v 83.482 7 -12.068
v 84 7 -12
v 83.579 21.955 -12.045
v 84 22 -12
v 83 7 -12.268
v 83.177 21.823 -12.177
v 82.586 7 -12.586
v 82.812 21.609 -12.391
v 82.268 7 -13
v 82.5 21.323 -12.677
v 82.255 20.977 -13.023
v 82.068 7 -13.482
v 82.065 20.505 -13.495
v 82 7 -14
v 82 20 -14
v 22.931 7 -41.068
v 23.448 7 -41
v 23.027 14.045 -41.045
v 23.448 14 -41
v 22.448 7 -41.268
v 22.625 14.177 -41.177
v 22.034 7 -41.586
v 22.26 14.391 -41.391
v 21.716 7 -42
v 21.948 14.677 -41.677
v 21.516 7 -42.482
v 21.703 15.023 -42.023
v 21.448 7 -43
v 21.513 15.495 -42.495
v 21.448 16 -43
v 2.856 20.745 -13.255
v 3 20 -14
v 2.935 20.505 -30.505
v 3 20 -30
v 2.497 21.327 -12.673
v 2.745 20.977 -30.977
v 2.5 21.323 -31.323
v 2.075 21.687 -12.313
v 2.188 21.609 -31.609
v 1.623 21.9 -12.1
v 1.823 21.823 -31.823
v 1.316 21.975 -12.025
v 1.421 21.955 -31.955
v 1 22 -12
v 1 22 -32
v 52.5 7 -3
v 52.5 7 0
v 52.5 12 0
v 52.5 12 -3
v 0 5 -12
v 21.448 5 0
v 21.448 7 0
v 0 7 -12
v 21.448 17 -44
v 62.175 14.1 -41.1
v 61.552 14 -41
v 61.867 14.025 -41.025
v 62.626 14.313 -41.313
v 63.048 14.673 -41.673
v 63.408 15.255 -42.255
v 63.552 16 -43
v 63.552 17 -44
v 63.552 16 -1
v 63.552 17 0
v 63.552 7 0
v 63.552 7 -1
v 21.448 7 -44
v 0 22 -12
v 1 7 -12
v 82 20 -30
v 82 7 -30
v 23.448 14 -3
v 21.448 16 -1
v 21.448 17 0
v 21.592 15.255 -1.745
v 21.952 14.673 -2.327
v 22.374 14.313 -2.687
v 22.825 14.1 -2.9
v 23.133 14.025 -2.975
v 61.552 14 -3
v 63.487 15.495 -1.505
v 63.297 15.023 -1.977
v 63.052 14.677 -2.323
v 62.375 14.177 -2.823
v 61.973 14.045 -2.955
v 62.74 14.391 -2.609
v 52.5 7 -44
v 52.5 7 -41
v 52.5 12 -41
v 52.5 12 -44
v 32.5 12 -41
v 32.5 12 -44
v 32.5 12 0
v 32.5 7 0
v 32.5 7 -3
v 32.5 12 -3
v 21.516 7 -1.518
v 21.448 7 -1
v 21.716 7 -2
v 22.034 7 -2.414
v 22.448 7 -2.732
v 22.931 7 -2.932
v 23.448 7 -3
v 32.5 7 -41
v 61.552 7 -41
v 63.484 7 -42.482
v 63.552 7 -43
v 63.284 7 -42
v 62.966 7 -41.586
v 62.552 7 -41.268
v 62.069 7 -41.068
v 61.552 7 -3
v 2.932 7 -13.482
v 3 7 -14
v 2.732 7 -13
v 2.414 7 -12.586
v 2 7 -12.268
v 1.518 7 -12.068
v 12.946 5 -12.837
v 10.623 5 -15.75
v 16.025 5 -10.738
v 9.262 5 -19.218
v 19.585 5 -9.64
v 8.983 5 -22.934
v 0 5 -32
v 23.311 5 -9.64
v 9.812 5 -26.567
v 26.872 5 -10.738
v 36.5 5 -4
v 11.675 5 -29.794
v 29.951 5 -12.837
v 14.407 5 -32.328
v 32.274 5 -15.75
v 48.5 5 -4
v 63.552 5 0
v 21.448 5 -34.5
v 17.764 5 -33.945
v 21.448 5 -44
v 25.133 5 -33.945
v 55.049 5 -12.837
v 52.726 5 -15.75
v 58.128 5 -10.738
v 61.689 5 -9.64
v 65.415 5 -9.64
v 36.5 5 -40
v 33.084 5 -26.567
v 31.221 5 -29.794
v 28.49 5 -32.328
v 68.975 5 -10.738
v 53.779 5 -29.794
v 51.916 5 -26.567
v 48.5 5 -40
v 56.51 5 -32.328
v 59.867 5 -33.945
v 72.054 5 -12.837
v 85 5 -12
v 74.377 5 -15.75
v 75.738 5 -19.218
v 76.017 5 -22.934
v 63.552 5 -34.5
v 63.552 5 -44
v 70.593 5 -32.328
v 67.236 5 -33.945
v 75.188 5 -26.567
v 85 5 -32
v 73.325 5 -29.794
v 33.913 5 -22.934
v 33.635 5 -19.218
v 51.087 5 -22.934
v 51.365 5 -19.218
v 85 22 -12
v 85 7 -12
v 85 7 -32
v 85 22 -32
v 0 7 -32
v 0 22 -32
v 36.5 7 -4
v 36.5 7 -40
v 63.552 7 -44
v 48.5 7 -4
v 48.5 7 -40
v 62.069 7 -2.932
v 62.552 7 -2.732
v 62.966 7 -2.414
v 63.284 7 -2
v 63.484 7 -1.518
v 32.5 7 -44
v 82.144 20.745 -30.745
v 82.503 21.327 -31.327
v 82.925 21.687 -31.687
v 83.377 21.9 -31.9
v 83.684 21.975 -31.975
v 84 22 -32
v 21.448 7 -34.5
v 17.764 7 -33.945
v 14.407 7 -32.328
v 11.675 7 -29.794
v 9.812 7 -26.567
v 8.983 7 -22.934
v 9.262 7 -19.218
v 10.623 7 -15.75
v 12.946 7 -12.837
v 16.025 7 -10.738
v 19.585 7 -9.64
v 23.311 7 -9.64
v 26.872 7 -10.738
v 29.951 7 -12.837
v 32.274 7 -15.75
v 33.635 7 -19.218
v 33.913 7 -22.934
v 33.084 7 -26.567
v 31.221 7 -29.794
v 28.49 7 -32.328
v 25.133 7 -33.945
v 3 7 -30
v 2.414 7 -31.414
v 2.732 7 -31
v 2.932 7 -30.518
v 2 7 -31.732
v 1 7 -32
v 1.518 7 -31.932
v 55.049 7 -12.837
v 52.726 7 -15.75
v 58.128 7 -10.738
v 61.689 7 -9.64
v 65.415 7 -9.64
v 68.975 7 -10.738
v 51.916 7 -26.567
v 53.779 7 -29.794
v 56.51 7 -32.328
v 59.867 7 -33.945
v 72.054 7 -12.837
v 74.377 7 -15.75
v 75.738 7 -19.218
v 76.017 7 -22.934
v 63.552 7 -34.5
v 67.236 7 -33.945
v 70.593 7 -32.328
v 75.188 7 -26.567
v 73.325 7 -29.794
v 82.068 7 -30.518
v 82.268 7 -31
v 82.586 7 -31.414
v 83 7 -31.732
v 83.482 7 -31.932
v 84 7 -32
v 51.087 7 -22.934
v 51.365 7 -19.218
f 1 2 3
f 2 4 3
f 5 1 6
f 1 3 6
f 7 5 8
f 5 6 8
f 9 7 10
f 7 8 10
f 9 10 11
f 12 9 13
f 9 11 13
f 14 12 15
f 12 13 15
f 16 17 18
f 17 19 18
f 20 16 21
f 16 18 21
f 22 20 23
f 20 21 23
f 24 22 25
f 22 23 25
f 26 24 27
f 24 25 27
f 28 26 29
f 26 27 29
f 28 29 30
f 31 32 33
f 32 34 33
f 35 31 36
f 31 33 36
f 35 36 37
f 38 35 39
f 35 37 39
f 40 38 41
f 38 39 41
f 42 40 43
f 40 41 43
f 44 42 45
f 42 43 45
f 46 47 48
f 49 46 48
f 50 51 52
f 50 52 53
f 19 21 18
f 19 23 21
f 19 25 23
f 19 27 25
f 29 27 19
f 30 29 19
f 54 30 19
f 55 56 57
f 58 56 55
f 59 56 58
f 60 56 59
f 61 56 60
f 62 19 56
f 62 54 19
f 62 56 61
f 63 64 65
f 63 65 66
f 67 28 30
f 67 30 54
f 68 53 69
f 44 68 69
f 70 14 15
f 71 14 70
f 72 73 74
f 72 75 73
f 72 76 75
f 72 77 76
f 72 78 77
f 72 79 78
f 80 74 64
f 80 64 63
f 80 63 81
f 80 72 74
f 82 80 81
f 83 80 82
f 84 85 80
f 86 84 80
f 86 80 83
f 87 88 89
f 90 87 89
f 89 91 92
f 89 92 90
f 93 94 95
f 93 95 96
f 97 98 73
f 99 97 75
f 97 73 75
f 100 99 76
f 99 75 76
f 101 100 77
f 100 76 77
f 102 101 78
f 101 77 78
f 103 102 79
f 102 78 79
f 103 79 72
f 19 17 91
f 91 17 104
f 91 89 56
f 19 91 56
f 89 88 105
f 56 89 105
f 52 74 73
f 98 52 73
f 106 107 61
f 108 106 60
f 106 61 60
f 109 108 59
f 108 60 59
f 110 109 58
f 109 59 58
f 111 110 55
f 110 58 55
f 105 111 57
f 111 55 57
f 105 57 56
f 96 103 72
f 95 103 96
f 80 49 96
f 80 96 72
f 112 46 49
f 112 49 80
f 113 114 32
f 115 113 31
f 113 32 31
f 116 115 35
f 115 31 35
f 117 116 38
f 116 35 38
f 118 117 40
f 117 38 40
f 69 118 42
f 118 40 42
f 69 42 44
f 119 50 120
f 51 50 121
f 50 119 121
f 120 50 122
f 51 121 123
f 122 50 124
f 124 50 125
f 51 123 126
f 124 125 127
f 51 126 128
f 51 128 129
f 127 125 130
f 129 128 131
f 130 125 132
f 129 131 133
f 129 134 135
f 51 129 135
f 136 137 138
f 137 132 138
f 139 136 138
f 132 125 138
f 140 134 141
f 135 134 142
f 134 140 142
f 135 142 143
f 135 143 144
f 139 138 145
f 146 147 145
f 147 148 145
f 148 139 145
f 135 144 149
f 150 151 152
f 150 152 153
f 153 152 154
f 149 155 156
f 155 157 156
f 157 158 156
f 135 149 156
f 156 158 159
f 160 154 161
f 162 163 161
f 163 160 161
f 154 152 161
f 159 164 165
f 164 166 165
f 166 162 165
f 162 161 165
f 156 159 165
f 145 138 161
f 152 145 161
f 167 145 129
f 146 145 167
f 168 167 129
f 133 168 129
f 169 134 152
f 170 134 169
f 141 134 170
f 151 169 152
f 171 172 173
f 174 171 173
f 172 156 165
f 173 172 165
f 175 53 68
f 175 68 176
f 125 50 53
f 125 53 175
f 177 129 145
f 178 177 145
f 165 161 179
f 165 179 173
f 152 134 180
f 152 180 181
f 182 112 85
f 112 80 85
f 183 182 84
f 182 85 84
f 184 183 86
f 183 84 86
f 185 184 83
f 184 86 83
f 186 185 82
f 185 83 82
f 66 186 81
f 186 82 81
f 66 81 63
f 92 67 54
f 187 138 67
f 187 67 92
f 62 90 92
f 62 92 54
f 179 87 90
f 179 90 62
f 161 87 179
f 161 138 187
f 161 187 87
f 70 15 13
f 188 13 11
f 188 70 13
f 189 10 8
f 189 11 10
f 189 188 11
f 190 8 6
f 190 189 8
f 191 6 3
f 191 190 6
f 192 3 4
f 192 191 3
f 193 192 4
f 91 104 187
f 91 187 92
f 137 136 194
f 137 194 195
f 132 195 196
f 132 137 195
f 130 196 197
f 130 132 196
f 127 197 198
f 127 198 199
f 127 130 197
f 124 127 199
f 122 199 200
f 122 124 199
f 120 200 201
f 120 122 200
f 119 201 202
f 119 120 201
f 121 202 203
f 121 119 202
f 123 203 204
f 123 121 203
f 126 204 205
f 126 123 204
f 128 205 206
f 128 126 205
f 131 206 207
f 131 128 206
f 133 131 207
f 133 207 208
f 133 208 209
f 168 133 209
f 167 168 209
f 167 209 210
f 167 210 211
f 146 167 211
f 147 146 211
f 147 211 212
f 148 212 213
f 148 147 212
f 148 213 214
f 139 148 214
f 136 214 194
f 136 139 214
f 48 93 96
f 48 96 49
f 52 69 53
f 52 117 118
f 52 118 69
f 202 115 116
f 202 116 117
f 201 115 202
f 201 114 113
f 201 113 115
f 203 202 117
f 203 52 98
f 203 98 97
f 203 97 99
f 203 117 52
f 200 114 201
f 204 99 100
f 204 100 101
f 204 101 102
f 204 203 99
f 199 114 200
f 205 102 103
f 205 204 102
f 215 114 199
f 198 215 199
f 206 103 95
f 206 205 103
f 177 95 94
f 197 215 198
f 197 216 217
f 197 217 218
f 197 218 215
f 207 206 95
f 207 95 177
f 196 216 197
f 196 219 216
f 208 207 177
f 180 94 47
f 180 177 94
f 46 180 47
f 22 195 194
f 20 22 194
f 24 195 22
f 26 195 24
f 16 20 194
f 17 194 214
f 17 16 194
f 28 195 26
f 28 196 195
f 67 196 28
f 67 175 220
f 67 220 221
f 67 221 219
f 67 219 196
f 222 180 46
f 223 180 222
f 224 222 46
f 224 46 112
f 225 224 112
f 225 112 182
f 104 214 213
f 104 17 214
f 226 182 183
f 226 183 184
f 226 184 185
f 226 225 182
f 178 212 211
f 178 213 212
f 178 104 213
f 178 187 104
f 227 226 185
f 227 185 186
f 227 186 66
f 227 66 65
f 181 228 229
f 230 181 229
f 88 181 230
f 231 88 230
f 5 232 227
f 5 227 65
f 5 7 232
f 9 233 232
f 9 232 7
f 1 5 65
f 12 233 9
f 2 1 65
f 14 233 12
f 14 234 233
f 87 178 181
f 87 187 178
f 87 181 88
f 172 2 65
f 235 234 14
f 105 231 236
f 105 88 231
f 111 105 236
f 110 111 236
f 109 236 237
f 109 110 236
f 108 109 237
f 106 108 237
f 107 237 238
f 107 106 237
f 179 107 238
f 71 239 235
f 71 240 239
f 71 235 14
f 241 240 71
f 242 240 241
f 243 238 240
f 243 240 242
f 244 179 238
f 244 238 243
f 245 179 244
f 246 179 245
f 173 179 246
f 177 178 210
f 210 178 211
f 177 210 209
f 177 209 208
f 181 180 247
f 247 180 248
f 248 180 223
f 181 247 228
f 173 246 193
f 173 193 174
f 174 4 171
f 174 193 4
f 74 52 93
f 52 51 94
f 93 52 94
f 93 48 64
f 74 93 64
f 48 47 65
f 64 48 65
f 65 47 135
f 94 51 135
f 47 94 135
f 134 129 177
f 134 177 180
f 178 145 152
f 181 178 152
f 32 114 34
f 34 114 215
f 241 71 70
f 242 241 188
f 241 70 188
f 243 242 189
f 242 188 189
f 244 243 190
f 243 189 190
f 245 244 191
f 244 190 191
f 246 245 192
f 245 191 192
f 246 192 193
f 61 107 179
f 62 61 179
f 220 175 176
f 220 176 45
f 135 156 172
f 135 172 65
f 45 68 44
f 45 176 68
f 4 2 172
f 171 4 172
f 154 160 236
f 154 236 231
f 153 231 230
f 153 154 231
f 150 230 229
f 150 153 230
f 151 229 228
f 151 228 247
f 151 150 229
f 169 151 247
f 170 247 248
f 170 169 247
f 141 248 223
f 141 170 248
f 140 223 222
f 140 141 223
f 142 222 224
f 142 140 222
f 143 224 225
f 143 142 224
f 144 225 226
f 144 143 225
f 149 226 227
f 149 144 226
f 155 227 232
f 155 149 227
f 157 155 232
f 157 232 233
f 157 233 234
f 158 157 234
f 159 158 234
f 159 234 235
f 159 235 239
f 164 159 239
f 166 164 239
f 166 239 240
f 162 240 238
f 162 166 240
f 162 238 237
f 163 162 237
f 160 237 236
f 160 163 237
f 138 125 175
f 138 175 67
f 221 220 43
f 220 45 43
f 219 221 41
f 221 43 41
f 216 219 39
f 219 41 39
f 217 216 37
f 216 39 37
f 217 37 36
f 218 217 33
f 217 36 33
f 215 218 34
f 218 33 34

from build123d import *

# Parameters (mm, degrees)
SKETCH1_W           = 85
SKETCH1_H           = 44
BOSS_EXTRUDE1_DEPTH = 2
SKETCH2_W           = 3
SKETCH2_H           = 20
BOSS_EXTRUDE2_DEPTH = 15
SKETCH3_W           = 42.103313086
SKETCH3_H           = 3
BOSS_EXTRUDE3_DEPTH = 10
SKETCH4_W           = 20
SKETCH4_H           = 5
CUT_EXTRUDE1_DEPTH  = 99.208960895
CHAMFER1_SIZE       = 3
FILLET1_R           = 2
SKETCH6_OUTSIDE_W   = 106.442
SKETCH6_OUTSIDE_H   = 65.442
SKETCH6_OUTSIDE_R   = 12.5
SKETCH6_OUTSIDE_W_2 = 12
SKETCH6_OUTSIDE_H_2 = 36
CUT_EXTRUDE3_DEPTH  = 2


with BuildPart() as part:
    # Sketch1 → Boss-Extrude1 (new body)
    with BuildSketch(Plane(origin=(0, 5, 0), x_dir=(1, 0, 0), z_dir=(0, 1, 0))):
        with Locations((42.5, 22)):
            Rectangle(SKETCH1_W, SKETCH1_H)
    extrude(amount=BOSS_EXTRUDE1_DEPTH)

    # Sketch2 → Boss-Extrude2 (add)
    with BuildSketch(Plane(origin=(0, 7, 0), x_dir=(1, 0, 0), z_dir=(0, 1, 0))):
        with Locations((1.5, 22)):
            Rectangle(SKETCH2_W, SKETCH2_H)
        with Locations((83.5, 22)):
            Rectangle(SKETCH2_W, SKETCH2_H)
    extrude(amount=BOSS_EXTRUDE2_DEPTH)

    # Sketch3 → Boss-Extrude3 (add)
    with BuildSketch(Plane(origin=(0, 7, 0), x_dir=(1, 0, 0), z_dir=(0, 1, 0))):
        with Locations((42.5, 42.5)):
            Rectangle(SKETCH3_W, SKETCH3_H)
        with Locations((42.5, 1.5)):
            Rectangle(SKETCH3_W, SKETCH3_H)
    extrude(amount=BOSS_EXTRUDE3_DEPTH)

    # Sketch4 → Cut-Extrude1 (cut, through all)
    with BuildSketch(Plane.XY):
        with Locations((42.5, 9.5)):
            Rectangle(SKETCH4_W, SKETCH4_H)
    extrude(amount=-CUT_EXTRUDE1_DEPTH, mode=Mode.SUBTRACT)

    # Chamfer1
    chamfer1_edges = [part.edges().sort_by_distance(p)[0] for p in [
        (42.5, 17, -3),
        (42.5, 17, -41),
    ]]
    chamfer(chamfer1_edges, length=CHAMFER1_SIZE - 0.0001)  # a hair under: the kernel refuses the full size

    # Fillet1
    fillet1_edges = [part.edges().sort_by_distance(p)[0] for p in [
        (3, 14.5, -12),
        (3, 14.5, -32),
        (3, 22, -22),
        (82, 14.5, -32),
        (82, 14.5, -12),
        (82, 22, -22),
        (0, 6, -44),
        (85, 6, -44),
        (85, 6, 0),
        (0, 6, 0),
        (21.448343457, 10.50005, -3),
        (63.551656543, 10.50005, -3),
        (63.551656543, 10.50005, -41),
        (21.448343457, 10.50005, -41),
    ]]
    fillet(fillet1_edges, radius=FILLET1_R)

    # Sketch6 outside → Cut-Extrude3 (cut)
    # profile 1 of 4: a face of its own
    with BuildSketch(Plane(origin=(0, 5, 0), x_dir=(1, 0, 0), z_dir=(0, 1, 0))):
        with Locations((42.5, 22)):
            Rectangle(SKETCH6_OUTSIDE_W, SKETCH6_OUTSIDE_H)
        Polygon((0, 32), (21.448343457, 44), (63.551656543, 44), (85, 32), (85, 12), (63.551656543, 0), (21.448343457, 0), (0, 12), align=None, mode=Mode.SUBTRACT)
    # profile 2 of 4: a face of its own
    with BuildSketch(Plane(origin=(0, 5, 0), x_dir=(1, 0, 0), z_dir=(0, 1, 0))):
        with Locations(Location((21.448343457, 22, 0), (0, 0, 90))):
            Circle(SKETCH6_OUTSIDE_R)
    # profile 3 of 4: a face of its own
    with BuildSketch(Plane(origin=(0, 5, 0), x_dir=(1, 0, 0), z_dir=(0, 1, 0))):
        with Locations(Location((63.551656543, 22, 0), (0, 0, 90))):
            Circle(SKETCH6_OUTSIDE_R)
    # profile 4 of 4: a face of its own
    with BuildSketch(Plane(origin=(0, 5, 0), x_dir=(1, 0, 0), z_dir=(0, 1, 0))):
        with Locations((42.5, 22)):
            Rectangle(SKETCH6_OUTSIDE_W_2, SKETCH6_OUTSIDE_H_2)
    extrude(amount=CUT_EXTRUDE3_DEPTH, mode=Mode.SUBTRACT)


solid = part.part
